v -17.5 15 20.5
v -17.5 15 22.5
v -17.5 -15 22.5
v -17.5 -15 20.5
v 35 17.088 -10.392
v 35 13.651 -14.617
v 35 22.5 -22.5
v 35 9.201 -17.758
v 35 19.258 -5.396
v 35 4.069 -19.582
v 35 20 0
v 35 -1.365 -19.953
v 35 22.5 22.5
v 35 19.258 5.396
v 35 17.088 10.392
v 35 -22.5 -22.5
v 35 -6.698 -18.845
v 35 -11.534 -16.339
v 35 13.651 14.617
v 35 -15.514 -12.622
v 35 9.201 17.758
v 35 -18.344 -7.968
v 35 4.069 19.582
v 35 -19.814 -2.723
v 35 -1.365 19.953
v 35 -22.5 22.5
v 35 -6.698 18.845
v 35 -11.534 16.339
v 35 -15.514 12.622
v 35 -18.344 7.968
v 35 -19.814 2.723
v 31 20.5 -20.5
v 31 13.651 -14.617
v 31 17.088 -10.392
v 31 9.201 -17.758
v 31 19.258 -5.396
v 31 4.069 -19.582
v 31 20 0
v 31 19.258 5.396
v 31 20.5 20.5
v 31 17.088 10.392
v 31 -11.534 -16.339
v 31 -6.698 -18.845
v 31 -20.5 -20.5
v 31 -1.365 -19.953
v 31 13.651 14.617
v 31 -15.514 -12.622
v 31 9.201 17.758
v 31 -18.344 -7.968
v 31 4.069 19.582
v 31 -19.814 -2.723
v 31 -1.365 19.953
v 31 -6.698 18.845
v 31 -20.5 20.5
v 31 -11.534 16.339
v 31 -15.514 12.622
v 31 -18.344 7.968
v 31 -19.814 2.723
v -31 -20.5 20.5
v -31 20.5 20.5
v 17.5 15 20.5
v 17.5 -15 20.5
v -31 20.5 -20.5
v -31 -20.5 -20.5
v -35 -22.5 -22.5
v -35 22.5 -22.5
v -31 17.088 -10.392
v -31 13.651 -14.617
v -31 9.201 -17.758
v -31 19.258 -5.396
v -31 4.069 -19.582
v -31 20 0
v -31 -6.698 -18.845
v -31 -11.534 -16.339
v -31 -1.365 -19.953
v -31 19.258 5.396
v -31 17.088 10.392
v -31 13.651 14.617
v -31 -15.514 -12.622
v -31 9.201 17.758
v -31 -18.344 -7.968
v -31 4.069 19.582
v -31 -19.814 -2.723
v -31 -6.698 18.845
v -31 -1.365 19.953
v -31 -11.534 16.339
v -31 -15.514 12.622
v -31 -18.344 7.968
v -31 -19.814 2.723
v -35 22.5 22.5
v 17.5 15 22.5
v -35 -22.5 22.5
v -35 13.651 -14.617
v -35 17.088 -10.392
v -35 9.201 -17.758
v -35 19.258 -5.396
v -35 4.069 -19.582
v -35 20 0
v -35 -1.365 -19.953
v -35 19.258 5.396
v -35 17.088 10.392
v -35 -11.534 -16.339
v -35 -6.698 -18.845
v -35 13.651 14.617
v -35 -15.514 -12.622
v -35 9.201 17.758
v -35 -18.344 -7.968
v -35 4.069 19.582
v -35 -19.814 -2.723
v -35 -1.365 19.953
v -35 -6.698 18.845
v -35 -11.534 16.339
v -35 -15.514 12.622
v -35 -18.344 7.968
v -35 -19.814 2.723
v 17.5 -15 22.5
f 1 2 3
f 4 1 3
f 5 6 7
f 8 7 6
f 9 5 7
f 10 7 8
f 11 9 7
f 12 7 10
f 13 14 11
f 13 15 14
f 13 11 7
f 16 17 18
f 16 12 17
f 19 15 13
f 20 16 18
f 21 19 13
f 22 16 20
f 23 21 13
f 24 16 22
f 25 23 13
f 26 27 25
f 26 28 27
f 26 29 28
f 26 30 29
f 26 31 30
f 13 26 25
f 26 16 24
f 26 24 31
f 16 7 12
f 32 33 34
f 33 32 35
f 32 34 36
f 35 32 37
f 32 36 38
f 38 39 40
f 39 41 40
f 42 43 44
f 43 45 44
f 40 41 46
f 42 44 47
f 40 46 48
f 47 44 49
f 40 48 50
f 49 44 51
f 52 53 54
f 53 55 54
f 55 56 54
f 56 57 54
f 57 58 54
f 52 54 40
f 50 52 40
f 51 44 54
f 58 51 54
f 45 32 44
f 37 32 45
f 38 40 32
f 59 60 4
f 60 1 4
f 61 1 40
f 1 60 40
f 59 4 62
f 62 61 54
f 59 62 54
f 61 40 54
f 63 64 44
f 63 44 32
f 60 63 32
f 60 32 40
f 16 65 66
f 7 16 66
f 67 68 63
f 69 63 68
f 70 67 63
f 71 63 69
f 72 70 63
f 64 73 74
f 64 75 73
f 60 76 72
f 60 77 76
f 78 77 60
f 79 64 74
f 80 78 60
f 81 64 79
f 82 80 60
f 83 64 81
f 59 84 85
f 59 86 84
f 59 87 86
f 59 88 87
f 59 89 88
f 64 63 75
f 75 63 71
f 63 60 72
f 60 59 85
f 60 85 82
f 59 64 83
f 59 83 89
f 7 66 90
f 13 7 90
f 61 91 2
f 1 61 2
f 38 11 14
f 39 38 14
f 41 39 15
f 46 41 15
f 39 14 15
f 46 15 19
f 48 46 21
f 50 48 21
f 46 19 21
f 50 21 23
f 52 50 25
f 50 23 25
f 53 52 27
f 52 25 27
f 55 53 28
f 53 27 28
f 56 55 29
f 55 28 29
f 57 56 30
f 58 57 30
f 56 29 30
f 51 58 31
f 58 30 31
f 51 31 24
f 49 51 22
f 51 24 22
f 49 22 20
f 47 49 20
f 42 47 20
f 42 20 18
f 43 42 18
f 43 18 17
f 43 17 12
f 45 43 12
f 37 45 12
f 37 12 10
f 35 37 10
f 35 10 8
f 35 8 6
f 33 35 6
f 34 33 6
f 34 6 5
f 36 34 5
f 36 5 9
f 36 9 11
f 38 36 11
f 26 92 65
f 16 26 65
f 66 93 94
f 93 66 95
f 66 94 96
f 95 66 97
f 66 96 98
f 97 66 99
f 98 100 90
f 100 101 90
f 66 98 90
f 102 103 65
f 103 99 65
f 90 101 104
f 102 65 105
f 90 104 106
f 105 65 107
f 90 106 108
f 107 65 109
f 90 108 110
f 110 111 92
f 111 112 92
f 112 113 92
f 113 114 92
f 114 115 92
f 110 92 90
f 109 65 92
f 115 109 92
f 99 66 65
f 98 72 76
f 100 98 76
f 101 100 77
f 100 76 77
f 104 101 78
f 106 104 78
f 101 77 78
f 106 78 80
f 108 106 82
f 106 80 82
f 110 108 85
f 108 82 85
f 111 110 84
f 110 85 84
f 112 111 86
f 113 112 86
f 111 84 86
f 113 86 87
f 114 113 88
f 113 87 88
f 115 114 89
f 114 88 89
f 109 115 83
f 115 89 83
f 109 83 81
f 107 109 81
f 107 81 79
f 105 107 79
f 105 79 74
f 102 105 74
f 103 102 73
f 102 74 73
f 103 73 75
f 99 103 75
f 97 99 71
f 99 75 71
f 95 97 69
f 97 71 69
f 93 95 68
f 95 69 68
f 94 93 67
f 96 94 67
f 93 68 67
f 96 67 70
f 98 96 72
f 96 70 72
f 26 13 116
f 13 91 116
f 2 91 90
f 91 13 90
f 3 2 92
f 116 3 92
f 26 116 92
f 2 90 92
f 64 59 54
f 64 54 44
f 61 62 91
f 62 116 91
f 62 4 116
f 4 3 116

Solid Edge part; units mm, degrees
sketch "Sketch1" plane through (0, 0, 0) normal (1, 0, 0) x (0, 1, 0)
  line L0 (-22.5, -22.5) -> (22.5, -22.5)
  line L1 (22.5, -22.5) -> (22.5, 22.5)
  line L2 (22.5, 22.5) -> (-22.5, 22.5)
  line L3 (-22.5, 22.5) -> (-22.5, -22.5)
extrude "Protrusion1" add sketch "Sketch1" along normal mid plane 70
sketch "Sketch2" plane through (35, 0, 0) normal (1, 0, 0) x (0, 1, 0)
  circle A0 centre (0, 0) radius 20
extrude "Cutout1" cut sketch "Sketch2" against normal up to next
sketch "Sketch3" plane through (31, 0, 0) normal (1, 0, 0) x (0, 1, 0)
  line L0 (-20.5, -20.5) -> (20.5, -20.5)
  line L1 (20.5, -20.5) -> (20.5, 20.5)
  line L2 (20.5, 20.5) -> (-20.5, 20.5)
  line L3 (-20.5, 20.5) -> (-20.5, -20.5)
extrude "ExtrudedCutout_4" cut sketch "Sketch3" against normal blind 62
sketch "Sketch4" plane through (0, 0, 22.5) normal (0, 0, 1) x (0, -1, 0)
  line L0 (-15, -17.5) -> (15, -17.5)
  line L1 (15, -17.5) -> (15, 17.5)
  line L2 (15, 17.5) -> (-15, 17.5)
  line L3 (-15, 17.5) -> (-15, -17.5)
extrude "Cutout2" cut sketch "Sketch4" against normal up to next
